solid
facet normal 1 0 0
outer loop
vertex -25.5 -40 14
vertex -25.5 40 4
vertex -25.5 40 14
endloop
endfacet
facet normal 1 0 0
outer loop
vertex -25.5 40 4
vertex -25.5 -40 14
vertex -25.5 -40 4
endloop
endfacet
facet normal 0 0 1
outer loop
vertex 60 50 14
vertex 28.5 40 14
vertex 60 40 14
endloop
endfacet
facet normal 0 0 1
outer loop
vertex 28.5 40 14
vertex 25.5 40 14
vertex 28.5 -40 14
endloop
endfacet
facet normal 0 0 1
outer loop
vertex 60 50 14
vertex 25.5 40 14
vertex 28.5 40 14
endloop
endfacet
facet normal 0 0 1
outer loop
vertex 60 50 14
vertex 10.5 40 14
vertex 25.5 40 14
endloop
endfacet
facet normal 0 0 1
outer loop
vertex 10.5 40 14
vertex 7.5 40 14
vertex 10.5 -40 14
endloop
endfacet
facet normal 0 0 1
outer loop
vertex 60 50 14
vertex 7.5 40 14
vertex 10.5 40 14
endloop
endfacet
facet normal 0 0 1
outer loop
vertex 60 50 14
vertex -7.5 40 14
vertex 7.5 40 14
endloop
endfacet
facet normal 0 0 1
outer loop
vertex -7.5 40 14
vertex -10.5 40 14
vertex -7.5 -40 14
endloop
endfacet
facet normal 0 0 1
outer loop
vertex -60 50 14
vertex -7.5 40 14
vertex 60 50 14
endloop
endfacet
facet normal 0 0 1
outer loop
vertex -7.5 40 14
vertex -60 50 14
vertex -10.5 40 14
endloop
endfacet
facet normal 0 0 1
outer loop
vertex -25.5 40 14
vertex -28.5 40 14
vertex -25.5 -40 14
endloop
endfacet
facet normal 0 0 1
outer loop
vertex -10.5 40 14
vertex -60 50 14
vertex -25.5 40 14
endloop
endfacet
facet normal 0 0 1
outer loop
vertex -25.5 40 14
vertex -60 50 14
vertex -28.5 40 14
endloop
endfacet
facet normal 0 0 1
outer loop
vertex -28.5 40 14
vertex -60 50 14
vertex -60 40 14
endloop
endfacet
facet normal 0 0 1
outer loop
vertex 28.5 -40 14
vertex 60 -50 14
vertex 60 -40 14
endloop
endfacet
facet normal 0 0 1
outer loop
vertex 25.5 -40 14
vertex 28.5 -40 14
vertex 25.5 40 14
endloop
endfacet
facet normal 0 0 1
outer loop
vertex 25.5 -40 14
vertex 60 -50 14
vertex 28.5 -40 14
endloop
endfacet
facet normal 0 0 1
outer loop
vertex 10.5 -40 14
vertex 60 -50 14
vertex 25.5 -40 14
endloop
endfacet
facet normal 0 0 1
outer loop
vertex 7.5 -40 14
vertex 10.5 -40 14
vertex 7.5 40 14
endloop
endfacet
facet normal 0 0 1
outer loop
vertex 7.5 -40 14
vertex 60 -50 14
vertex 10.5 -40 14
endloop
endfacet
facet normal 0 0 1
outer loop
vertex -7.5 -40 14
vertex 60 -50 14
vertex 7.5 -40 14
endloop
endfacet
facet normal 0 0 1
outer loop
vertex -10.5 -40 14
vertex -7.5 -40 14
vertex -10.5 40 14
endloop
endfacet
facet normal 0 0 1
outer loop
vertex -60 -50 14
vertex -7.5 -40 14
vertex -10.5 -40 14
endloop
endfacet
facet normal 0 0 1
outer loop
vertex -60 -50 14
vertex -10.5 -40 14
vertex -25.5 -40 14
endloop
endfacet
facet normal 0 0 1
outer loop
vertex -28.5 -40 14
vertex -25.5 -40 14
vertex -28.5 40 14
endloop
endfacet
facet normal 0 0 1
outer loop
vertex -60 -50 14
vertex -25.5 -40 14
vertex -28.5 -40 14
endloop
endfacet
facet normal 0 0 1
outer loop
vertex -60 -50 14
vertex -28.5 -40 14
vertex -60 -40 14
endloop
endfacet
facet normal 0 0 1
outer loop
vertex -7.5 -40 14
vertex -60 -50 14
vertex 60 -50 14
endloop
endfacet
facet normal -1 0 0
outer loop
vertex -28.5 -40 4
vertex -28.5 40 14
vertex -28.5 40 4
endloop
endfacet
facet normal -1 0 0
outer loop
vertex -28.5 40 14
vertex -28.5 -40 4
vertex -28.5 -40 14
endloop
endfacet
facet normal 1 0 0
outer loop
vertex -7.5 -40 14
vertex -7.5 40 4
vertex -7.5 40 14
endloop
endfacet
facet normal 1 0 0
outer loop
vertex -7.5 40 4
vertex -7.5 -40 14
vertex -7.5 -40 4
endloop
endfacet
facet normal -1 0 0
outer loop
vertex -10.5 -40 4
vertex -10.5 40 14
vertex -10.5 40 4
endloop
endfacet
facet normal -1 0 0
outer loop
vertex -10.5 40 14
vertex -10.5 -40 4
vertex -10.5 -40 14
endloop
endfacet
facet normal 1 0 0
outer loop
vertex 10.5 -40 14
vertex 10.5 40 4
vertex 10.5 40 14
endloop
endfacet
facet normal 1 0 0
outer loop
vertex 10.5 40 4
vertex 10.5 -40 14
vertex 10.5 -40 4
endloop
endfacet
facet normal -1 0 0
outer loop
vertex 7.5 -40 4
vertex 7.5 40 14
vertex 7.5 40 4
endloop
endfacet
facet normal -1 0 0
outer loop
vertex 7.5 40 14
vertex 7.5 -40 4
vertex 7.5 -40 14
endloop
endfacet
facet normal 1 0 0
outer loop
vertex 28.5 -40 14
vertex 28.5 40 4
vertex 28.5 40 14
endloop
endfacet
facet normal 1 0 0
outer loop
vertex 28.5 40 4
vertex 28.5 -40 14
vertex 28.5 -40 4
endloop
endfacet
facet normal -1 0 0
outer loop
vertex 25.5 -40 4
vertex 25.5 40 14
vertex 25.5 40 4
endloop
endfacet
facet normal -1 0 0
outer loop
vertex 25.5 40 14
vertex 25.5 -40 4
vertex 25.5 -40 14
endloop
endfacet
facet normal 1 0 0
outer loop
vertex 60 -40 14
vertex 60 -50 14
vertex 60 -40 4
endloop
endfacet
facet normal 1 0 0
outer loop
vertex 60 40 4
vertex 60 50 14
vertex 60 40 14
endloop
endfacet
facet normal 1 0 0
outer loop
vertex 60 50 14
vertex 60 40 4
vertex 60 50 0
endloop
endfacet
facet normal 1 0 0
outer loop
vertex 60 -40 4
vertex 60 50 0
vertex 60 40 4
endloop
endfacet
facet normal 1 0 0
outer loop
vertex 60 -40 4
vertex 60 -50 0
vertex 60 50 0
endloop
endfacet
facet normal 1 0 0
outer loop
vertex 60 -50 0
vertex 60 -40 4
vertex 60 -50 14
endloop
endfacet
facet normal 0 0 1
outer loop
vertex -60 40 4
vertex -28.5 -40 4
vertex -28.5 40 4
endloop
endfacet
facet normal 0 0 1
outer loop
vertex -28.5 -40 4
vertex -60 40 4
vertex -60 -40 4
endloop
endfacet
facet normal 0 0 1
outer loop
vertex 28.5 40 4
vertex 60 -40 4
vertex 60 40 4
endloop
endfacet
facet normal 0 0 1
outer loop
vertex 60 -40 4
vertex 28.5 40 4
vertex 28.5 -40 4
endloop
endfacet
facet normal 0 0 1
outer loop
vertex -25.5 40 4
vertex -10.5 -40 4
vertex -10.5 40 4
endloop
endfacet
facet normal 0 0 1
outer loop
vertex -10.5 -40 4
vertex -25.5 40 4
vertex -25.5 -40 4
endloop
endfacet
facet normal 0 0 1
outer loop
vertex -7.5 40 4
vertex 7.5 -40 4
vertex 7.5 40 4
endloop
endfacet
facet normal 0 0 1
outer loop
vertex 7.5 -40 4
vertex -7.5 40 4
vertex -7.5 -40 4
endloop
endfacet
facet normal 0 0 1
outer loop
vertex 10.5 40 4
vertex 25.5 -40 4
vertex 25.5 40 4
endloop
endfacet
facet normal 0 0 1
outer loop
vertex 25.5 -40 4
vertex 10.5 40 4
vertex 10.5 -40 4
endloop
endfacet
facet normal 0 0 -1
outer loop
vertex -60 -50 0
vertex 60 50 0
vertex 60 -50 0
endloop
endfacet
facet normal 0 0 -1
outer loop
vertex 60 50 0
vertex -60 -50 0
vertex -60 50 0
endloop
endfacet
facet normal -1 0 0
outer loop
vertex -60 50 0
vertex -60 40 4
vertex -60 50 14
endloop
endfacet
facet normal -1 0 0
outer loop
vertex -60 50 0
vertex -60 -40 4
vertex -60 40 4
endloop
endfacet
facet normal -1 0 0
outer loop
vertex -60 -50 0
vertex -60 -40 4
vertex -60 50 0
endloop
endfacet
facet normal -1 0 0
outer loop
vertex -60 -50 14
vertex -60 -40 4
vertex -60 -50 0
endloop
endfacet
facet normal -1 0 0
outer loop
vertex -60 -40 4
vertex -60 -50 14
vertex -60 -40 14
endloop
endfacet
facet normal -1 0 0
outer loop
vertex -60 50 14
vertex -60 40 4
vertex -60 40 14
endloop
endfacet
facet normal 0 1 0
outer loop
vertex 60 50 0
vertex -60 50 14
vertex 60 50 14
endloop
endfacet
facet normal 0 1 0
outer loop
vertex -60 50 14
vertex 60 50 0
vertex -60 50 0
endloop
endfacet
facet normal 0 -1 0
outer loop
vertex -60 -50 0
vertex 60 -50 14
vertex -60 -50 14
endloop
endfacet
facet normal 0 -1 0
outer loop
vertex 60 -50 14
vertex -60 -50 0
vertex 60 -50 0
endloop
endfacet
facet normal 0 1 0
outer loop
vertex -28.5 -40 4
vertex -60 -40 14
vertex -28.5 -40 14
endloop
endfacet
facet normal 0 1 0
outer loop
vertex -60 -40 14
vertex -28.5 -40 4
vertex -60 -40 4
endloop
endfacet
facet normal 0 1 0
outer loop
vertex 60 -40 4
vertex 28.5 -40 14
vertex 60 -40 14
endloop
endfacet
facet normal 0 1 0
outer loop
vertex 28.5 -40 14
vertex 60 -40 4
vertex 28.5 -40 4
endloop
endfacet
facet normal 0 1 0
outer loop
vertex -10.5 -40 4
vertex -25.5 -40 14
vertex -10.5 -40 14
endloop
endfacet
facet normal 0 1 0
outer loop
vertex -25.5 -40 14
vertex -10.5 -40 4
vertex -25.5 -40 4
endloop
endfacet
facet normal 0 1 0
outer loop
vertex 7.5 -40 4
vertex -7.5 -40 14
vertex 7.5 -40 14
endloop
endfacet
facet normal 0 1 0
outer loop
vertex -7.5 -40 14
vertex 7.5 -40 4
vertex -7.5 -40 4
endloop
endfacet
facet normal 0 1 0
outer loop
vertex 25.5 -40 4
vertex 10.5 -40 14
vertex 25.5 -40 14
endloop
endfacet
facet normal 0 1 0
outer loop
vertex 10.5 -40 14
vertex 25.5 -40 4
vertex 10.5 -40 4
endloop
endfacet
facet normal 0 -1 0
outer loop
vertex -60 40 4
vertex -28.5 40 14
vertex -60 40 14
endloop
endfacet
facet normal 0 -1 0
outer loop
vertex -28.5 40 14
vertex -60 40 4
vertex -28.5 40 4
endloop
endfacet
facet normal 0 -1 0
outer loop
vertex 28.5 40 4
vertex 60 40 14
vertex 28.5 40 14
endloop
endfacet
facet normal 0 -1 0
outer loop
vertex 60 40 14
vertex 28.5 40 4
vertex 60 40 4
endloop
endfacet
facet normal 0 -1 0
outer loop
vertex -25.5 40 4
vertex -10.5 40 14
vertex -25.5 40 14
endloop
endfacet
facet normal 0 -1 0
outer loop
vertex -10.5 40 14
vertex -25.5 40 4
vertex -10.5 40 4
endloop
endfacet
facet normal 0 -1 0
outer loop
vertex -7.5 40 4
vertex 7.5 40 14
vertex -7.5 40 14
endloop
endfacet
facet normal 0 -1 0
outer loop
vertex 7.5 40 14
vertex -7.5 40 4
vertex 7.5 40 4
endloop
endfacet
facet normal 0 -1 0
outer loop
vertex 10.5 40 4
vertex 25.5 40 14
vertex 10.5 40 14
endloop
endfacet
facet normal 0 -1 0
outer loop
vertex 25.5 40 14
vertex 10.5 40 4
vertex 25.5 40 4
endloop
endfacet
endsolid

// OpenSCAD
$fn = 32;

// ----------------------------------------------------------------------
// Rib frame 120 x 100 x 14
// 4 ribs at 18 mm pitch
// ----------------------------------------------------------------------

// --- parameters (mm) ---
frame = [120, 100, 4];  // base plate size (x, y, z)
rail_w = 10;            // side rail width
ribs = 4;               // number of ribs
rib_t = 3;              // rib thickness
rib_h = 10;             // rib height above the base plate
pitch = 18;             // pitch between rib centres

// --- derived feature positions (mm) ---
span = (ribs - 1) * pitch;          // = 54   distance between the outer ribs
origin_x = -span / 2;               // = -27   X of the first rib
rib_len = frame[1] - 2 * rail_w + 2;  // = 82   rib length, 1 mm into each rail
feature_centers = [
  [origin_x + 0 * pitch, 0],
  [origin_x + 1 * pitch, 0],
  [origin_x + 2 * pitch, 0],
  [origin_x + 3 * pitch, 0]
];   // rib centre line, drives the rib loop

// base plate, two side rails, then the ribs read straight off feature_centers
union() {
  translate([-frame[0] / 2, -frame[1] / 2, 0]) cube(frame);
  translate([-frame[0] / 2, -frame[1] / 2, 0]) cube([frame[0], rail_w, frame[2] + rib_h]);
  translate([-frame[0] / 2, frame[1] / 2 - rail_w, 0]) cube([frame[0], rail_w, frame[2] + rib_h]);
  for (centre = feature_centers)
    translate([centre[0] - rib_t / 2, centre[1] - rib_len / 2, frame[2] - 1])
      cube([rib_t, rib_len, rib_h + 1]);
}
